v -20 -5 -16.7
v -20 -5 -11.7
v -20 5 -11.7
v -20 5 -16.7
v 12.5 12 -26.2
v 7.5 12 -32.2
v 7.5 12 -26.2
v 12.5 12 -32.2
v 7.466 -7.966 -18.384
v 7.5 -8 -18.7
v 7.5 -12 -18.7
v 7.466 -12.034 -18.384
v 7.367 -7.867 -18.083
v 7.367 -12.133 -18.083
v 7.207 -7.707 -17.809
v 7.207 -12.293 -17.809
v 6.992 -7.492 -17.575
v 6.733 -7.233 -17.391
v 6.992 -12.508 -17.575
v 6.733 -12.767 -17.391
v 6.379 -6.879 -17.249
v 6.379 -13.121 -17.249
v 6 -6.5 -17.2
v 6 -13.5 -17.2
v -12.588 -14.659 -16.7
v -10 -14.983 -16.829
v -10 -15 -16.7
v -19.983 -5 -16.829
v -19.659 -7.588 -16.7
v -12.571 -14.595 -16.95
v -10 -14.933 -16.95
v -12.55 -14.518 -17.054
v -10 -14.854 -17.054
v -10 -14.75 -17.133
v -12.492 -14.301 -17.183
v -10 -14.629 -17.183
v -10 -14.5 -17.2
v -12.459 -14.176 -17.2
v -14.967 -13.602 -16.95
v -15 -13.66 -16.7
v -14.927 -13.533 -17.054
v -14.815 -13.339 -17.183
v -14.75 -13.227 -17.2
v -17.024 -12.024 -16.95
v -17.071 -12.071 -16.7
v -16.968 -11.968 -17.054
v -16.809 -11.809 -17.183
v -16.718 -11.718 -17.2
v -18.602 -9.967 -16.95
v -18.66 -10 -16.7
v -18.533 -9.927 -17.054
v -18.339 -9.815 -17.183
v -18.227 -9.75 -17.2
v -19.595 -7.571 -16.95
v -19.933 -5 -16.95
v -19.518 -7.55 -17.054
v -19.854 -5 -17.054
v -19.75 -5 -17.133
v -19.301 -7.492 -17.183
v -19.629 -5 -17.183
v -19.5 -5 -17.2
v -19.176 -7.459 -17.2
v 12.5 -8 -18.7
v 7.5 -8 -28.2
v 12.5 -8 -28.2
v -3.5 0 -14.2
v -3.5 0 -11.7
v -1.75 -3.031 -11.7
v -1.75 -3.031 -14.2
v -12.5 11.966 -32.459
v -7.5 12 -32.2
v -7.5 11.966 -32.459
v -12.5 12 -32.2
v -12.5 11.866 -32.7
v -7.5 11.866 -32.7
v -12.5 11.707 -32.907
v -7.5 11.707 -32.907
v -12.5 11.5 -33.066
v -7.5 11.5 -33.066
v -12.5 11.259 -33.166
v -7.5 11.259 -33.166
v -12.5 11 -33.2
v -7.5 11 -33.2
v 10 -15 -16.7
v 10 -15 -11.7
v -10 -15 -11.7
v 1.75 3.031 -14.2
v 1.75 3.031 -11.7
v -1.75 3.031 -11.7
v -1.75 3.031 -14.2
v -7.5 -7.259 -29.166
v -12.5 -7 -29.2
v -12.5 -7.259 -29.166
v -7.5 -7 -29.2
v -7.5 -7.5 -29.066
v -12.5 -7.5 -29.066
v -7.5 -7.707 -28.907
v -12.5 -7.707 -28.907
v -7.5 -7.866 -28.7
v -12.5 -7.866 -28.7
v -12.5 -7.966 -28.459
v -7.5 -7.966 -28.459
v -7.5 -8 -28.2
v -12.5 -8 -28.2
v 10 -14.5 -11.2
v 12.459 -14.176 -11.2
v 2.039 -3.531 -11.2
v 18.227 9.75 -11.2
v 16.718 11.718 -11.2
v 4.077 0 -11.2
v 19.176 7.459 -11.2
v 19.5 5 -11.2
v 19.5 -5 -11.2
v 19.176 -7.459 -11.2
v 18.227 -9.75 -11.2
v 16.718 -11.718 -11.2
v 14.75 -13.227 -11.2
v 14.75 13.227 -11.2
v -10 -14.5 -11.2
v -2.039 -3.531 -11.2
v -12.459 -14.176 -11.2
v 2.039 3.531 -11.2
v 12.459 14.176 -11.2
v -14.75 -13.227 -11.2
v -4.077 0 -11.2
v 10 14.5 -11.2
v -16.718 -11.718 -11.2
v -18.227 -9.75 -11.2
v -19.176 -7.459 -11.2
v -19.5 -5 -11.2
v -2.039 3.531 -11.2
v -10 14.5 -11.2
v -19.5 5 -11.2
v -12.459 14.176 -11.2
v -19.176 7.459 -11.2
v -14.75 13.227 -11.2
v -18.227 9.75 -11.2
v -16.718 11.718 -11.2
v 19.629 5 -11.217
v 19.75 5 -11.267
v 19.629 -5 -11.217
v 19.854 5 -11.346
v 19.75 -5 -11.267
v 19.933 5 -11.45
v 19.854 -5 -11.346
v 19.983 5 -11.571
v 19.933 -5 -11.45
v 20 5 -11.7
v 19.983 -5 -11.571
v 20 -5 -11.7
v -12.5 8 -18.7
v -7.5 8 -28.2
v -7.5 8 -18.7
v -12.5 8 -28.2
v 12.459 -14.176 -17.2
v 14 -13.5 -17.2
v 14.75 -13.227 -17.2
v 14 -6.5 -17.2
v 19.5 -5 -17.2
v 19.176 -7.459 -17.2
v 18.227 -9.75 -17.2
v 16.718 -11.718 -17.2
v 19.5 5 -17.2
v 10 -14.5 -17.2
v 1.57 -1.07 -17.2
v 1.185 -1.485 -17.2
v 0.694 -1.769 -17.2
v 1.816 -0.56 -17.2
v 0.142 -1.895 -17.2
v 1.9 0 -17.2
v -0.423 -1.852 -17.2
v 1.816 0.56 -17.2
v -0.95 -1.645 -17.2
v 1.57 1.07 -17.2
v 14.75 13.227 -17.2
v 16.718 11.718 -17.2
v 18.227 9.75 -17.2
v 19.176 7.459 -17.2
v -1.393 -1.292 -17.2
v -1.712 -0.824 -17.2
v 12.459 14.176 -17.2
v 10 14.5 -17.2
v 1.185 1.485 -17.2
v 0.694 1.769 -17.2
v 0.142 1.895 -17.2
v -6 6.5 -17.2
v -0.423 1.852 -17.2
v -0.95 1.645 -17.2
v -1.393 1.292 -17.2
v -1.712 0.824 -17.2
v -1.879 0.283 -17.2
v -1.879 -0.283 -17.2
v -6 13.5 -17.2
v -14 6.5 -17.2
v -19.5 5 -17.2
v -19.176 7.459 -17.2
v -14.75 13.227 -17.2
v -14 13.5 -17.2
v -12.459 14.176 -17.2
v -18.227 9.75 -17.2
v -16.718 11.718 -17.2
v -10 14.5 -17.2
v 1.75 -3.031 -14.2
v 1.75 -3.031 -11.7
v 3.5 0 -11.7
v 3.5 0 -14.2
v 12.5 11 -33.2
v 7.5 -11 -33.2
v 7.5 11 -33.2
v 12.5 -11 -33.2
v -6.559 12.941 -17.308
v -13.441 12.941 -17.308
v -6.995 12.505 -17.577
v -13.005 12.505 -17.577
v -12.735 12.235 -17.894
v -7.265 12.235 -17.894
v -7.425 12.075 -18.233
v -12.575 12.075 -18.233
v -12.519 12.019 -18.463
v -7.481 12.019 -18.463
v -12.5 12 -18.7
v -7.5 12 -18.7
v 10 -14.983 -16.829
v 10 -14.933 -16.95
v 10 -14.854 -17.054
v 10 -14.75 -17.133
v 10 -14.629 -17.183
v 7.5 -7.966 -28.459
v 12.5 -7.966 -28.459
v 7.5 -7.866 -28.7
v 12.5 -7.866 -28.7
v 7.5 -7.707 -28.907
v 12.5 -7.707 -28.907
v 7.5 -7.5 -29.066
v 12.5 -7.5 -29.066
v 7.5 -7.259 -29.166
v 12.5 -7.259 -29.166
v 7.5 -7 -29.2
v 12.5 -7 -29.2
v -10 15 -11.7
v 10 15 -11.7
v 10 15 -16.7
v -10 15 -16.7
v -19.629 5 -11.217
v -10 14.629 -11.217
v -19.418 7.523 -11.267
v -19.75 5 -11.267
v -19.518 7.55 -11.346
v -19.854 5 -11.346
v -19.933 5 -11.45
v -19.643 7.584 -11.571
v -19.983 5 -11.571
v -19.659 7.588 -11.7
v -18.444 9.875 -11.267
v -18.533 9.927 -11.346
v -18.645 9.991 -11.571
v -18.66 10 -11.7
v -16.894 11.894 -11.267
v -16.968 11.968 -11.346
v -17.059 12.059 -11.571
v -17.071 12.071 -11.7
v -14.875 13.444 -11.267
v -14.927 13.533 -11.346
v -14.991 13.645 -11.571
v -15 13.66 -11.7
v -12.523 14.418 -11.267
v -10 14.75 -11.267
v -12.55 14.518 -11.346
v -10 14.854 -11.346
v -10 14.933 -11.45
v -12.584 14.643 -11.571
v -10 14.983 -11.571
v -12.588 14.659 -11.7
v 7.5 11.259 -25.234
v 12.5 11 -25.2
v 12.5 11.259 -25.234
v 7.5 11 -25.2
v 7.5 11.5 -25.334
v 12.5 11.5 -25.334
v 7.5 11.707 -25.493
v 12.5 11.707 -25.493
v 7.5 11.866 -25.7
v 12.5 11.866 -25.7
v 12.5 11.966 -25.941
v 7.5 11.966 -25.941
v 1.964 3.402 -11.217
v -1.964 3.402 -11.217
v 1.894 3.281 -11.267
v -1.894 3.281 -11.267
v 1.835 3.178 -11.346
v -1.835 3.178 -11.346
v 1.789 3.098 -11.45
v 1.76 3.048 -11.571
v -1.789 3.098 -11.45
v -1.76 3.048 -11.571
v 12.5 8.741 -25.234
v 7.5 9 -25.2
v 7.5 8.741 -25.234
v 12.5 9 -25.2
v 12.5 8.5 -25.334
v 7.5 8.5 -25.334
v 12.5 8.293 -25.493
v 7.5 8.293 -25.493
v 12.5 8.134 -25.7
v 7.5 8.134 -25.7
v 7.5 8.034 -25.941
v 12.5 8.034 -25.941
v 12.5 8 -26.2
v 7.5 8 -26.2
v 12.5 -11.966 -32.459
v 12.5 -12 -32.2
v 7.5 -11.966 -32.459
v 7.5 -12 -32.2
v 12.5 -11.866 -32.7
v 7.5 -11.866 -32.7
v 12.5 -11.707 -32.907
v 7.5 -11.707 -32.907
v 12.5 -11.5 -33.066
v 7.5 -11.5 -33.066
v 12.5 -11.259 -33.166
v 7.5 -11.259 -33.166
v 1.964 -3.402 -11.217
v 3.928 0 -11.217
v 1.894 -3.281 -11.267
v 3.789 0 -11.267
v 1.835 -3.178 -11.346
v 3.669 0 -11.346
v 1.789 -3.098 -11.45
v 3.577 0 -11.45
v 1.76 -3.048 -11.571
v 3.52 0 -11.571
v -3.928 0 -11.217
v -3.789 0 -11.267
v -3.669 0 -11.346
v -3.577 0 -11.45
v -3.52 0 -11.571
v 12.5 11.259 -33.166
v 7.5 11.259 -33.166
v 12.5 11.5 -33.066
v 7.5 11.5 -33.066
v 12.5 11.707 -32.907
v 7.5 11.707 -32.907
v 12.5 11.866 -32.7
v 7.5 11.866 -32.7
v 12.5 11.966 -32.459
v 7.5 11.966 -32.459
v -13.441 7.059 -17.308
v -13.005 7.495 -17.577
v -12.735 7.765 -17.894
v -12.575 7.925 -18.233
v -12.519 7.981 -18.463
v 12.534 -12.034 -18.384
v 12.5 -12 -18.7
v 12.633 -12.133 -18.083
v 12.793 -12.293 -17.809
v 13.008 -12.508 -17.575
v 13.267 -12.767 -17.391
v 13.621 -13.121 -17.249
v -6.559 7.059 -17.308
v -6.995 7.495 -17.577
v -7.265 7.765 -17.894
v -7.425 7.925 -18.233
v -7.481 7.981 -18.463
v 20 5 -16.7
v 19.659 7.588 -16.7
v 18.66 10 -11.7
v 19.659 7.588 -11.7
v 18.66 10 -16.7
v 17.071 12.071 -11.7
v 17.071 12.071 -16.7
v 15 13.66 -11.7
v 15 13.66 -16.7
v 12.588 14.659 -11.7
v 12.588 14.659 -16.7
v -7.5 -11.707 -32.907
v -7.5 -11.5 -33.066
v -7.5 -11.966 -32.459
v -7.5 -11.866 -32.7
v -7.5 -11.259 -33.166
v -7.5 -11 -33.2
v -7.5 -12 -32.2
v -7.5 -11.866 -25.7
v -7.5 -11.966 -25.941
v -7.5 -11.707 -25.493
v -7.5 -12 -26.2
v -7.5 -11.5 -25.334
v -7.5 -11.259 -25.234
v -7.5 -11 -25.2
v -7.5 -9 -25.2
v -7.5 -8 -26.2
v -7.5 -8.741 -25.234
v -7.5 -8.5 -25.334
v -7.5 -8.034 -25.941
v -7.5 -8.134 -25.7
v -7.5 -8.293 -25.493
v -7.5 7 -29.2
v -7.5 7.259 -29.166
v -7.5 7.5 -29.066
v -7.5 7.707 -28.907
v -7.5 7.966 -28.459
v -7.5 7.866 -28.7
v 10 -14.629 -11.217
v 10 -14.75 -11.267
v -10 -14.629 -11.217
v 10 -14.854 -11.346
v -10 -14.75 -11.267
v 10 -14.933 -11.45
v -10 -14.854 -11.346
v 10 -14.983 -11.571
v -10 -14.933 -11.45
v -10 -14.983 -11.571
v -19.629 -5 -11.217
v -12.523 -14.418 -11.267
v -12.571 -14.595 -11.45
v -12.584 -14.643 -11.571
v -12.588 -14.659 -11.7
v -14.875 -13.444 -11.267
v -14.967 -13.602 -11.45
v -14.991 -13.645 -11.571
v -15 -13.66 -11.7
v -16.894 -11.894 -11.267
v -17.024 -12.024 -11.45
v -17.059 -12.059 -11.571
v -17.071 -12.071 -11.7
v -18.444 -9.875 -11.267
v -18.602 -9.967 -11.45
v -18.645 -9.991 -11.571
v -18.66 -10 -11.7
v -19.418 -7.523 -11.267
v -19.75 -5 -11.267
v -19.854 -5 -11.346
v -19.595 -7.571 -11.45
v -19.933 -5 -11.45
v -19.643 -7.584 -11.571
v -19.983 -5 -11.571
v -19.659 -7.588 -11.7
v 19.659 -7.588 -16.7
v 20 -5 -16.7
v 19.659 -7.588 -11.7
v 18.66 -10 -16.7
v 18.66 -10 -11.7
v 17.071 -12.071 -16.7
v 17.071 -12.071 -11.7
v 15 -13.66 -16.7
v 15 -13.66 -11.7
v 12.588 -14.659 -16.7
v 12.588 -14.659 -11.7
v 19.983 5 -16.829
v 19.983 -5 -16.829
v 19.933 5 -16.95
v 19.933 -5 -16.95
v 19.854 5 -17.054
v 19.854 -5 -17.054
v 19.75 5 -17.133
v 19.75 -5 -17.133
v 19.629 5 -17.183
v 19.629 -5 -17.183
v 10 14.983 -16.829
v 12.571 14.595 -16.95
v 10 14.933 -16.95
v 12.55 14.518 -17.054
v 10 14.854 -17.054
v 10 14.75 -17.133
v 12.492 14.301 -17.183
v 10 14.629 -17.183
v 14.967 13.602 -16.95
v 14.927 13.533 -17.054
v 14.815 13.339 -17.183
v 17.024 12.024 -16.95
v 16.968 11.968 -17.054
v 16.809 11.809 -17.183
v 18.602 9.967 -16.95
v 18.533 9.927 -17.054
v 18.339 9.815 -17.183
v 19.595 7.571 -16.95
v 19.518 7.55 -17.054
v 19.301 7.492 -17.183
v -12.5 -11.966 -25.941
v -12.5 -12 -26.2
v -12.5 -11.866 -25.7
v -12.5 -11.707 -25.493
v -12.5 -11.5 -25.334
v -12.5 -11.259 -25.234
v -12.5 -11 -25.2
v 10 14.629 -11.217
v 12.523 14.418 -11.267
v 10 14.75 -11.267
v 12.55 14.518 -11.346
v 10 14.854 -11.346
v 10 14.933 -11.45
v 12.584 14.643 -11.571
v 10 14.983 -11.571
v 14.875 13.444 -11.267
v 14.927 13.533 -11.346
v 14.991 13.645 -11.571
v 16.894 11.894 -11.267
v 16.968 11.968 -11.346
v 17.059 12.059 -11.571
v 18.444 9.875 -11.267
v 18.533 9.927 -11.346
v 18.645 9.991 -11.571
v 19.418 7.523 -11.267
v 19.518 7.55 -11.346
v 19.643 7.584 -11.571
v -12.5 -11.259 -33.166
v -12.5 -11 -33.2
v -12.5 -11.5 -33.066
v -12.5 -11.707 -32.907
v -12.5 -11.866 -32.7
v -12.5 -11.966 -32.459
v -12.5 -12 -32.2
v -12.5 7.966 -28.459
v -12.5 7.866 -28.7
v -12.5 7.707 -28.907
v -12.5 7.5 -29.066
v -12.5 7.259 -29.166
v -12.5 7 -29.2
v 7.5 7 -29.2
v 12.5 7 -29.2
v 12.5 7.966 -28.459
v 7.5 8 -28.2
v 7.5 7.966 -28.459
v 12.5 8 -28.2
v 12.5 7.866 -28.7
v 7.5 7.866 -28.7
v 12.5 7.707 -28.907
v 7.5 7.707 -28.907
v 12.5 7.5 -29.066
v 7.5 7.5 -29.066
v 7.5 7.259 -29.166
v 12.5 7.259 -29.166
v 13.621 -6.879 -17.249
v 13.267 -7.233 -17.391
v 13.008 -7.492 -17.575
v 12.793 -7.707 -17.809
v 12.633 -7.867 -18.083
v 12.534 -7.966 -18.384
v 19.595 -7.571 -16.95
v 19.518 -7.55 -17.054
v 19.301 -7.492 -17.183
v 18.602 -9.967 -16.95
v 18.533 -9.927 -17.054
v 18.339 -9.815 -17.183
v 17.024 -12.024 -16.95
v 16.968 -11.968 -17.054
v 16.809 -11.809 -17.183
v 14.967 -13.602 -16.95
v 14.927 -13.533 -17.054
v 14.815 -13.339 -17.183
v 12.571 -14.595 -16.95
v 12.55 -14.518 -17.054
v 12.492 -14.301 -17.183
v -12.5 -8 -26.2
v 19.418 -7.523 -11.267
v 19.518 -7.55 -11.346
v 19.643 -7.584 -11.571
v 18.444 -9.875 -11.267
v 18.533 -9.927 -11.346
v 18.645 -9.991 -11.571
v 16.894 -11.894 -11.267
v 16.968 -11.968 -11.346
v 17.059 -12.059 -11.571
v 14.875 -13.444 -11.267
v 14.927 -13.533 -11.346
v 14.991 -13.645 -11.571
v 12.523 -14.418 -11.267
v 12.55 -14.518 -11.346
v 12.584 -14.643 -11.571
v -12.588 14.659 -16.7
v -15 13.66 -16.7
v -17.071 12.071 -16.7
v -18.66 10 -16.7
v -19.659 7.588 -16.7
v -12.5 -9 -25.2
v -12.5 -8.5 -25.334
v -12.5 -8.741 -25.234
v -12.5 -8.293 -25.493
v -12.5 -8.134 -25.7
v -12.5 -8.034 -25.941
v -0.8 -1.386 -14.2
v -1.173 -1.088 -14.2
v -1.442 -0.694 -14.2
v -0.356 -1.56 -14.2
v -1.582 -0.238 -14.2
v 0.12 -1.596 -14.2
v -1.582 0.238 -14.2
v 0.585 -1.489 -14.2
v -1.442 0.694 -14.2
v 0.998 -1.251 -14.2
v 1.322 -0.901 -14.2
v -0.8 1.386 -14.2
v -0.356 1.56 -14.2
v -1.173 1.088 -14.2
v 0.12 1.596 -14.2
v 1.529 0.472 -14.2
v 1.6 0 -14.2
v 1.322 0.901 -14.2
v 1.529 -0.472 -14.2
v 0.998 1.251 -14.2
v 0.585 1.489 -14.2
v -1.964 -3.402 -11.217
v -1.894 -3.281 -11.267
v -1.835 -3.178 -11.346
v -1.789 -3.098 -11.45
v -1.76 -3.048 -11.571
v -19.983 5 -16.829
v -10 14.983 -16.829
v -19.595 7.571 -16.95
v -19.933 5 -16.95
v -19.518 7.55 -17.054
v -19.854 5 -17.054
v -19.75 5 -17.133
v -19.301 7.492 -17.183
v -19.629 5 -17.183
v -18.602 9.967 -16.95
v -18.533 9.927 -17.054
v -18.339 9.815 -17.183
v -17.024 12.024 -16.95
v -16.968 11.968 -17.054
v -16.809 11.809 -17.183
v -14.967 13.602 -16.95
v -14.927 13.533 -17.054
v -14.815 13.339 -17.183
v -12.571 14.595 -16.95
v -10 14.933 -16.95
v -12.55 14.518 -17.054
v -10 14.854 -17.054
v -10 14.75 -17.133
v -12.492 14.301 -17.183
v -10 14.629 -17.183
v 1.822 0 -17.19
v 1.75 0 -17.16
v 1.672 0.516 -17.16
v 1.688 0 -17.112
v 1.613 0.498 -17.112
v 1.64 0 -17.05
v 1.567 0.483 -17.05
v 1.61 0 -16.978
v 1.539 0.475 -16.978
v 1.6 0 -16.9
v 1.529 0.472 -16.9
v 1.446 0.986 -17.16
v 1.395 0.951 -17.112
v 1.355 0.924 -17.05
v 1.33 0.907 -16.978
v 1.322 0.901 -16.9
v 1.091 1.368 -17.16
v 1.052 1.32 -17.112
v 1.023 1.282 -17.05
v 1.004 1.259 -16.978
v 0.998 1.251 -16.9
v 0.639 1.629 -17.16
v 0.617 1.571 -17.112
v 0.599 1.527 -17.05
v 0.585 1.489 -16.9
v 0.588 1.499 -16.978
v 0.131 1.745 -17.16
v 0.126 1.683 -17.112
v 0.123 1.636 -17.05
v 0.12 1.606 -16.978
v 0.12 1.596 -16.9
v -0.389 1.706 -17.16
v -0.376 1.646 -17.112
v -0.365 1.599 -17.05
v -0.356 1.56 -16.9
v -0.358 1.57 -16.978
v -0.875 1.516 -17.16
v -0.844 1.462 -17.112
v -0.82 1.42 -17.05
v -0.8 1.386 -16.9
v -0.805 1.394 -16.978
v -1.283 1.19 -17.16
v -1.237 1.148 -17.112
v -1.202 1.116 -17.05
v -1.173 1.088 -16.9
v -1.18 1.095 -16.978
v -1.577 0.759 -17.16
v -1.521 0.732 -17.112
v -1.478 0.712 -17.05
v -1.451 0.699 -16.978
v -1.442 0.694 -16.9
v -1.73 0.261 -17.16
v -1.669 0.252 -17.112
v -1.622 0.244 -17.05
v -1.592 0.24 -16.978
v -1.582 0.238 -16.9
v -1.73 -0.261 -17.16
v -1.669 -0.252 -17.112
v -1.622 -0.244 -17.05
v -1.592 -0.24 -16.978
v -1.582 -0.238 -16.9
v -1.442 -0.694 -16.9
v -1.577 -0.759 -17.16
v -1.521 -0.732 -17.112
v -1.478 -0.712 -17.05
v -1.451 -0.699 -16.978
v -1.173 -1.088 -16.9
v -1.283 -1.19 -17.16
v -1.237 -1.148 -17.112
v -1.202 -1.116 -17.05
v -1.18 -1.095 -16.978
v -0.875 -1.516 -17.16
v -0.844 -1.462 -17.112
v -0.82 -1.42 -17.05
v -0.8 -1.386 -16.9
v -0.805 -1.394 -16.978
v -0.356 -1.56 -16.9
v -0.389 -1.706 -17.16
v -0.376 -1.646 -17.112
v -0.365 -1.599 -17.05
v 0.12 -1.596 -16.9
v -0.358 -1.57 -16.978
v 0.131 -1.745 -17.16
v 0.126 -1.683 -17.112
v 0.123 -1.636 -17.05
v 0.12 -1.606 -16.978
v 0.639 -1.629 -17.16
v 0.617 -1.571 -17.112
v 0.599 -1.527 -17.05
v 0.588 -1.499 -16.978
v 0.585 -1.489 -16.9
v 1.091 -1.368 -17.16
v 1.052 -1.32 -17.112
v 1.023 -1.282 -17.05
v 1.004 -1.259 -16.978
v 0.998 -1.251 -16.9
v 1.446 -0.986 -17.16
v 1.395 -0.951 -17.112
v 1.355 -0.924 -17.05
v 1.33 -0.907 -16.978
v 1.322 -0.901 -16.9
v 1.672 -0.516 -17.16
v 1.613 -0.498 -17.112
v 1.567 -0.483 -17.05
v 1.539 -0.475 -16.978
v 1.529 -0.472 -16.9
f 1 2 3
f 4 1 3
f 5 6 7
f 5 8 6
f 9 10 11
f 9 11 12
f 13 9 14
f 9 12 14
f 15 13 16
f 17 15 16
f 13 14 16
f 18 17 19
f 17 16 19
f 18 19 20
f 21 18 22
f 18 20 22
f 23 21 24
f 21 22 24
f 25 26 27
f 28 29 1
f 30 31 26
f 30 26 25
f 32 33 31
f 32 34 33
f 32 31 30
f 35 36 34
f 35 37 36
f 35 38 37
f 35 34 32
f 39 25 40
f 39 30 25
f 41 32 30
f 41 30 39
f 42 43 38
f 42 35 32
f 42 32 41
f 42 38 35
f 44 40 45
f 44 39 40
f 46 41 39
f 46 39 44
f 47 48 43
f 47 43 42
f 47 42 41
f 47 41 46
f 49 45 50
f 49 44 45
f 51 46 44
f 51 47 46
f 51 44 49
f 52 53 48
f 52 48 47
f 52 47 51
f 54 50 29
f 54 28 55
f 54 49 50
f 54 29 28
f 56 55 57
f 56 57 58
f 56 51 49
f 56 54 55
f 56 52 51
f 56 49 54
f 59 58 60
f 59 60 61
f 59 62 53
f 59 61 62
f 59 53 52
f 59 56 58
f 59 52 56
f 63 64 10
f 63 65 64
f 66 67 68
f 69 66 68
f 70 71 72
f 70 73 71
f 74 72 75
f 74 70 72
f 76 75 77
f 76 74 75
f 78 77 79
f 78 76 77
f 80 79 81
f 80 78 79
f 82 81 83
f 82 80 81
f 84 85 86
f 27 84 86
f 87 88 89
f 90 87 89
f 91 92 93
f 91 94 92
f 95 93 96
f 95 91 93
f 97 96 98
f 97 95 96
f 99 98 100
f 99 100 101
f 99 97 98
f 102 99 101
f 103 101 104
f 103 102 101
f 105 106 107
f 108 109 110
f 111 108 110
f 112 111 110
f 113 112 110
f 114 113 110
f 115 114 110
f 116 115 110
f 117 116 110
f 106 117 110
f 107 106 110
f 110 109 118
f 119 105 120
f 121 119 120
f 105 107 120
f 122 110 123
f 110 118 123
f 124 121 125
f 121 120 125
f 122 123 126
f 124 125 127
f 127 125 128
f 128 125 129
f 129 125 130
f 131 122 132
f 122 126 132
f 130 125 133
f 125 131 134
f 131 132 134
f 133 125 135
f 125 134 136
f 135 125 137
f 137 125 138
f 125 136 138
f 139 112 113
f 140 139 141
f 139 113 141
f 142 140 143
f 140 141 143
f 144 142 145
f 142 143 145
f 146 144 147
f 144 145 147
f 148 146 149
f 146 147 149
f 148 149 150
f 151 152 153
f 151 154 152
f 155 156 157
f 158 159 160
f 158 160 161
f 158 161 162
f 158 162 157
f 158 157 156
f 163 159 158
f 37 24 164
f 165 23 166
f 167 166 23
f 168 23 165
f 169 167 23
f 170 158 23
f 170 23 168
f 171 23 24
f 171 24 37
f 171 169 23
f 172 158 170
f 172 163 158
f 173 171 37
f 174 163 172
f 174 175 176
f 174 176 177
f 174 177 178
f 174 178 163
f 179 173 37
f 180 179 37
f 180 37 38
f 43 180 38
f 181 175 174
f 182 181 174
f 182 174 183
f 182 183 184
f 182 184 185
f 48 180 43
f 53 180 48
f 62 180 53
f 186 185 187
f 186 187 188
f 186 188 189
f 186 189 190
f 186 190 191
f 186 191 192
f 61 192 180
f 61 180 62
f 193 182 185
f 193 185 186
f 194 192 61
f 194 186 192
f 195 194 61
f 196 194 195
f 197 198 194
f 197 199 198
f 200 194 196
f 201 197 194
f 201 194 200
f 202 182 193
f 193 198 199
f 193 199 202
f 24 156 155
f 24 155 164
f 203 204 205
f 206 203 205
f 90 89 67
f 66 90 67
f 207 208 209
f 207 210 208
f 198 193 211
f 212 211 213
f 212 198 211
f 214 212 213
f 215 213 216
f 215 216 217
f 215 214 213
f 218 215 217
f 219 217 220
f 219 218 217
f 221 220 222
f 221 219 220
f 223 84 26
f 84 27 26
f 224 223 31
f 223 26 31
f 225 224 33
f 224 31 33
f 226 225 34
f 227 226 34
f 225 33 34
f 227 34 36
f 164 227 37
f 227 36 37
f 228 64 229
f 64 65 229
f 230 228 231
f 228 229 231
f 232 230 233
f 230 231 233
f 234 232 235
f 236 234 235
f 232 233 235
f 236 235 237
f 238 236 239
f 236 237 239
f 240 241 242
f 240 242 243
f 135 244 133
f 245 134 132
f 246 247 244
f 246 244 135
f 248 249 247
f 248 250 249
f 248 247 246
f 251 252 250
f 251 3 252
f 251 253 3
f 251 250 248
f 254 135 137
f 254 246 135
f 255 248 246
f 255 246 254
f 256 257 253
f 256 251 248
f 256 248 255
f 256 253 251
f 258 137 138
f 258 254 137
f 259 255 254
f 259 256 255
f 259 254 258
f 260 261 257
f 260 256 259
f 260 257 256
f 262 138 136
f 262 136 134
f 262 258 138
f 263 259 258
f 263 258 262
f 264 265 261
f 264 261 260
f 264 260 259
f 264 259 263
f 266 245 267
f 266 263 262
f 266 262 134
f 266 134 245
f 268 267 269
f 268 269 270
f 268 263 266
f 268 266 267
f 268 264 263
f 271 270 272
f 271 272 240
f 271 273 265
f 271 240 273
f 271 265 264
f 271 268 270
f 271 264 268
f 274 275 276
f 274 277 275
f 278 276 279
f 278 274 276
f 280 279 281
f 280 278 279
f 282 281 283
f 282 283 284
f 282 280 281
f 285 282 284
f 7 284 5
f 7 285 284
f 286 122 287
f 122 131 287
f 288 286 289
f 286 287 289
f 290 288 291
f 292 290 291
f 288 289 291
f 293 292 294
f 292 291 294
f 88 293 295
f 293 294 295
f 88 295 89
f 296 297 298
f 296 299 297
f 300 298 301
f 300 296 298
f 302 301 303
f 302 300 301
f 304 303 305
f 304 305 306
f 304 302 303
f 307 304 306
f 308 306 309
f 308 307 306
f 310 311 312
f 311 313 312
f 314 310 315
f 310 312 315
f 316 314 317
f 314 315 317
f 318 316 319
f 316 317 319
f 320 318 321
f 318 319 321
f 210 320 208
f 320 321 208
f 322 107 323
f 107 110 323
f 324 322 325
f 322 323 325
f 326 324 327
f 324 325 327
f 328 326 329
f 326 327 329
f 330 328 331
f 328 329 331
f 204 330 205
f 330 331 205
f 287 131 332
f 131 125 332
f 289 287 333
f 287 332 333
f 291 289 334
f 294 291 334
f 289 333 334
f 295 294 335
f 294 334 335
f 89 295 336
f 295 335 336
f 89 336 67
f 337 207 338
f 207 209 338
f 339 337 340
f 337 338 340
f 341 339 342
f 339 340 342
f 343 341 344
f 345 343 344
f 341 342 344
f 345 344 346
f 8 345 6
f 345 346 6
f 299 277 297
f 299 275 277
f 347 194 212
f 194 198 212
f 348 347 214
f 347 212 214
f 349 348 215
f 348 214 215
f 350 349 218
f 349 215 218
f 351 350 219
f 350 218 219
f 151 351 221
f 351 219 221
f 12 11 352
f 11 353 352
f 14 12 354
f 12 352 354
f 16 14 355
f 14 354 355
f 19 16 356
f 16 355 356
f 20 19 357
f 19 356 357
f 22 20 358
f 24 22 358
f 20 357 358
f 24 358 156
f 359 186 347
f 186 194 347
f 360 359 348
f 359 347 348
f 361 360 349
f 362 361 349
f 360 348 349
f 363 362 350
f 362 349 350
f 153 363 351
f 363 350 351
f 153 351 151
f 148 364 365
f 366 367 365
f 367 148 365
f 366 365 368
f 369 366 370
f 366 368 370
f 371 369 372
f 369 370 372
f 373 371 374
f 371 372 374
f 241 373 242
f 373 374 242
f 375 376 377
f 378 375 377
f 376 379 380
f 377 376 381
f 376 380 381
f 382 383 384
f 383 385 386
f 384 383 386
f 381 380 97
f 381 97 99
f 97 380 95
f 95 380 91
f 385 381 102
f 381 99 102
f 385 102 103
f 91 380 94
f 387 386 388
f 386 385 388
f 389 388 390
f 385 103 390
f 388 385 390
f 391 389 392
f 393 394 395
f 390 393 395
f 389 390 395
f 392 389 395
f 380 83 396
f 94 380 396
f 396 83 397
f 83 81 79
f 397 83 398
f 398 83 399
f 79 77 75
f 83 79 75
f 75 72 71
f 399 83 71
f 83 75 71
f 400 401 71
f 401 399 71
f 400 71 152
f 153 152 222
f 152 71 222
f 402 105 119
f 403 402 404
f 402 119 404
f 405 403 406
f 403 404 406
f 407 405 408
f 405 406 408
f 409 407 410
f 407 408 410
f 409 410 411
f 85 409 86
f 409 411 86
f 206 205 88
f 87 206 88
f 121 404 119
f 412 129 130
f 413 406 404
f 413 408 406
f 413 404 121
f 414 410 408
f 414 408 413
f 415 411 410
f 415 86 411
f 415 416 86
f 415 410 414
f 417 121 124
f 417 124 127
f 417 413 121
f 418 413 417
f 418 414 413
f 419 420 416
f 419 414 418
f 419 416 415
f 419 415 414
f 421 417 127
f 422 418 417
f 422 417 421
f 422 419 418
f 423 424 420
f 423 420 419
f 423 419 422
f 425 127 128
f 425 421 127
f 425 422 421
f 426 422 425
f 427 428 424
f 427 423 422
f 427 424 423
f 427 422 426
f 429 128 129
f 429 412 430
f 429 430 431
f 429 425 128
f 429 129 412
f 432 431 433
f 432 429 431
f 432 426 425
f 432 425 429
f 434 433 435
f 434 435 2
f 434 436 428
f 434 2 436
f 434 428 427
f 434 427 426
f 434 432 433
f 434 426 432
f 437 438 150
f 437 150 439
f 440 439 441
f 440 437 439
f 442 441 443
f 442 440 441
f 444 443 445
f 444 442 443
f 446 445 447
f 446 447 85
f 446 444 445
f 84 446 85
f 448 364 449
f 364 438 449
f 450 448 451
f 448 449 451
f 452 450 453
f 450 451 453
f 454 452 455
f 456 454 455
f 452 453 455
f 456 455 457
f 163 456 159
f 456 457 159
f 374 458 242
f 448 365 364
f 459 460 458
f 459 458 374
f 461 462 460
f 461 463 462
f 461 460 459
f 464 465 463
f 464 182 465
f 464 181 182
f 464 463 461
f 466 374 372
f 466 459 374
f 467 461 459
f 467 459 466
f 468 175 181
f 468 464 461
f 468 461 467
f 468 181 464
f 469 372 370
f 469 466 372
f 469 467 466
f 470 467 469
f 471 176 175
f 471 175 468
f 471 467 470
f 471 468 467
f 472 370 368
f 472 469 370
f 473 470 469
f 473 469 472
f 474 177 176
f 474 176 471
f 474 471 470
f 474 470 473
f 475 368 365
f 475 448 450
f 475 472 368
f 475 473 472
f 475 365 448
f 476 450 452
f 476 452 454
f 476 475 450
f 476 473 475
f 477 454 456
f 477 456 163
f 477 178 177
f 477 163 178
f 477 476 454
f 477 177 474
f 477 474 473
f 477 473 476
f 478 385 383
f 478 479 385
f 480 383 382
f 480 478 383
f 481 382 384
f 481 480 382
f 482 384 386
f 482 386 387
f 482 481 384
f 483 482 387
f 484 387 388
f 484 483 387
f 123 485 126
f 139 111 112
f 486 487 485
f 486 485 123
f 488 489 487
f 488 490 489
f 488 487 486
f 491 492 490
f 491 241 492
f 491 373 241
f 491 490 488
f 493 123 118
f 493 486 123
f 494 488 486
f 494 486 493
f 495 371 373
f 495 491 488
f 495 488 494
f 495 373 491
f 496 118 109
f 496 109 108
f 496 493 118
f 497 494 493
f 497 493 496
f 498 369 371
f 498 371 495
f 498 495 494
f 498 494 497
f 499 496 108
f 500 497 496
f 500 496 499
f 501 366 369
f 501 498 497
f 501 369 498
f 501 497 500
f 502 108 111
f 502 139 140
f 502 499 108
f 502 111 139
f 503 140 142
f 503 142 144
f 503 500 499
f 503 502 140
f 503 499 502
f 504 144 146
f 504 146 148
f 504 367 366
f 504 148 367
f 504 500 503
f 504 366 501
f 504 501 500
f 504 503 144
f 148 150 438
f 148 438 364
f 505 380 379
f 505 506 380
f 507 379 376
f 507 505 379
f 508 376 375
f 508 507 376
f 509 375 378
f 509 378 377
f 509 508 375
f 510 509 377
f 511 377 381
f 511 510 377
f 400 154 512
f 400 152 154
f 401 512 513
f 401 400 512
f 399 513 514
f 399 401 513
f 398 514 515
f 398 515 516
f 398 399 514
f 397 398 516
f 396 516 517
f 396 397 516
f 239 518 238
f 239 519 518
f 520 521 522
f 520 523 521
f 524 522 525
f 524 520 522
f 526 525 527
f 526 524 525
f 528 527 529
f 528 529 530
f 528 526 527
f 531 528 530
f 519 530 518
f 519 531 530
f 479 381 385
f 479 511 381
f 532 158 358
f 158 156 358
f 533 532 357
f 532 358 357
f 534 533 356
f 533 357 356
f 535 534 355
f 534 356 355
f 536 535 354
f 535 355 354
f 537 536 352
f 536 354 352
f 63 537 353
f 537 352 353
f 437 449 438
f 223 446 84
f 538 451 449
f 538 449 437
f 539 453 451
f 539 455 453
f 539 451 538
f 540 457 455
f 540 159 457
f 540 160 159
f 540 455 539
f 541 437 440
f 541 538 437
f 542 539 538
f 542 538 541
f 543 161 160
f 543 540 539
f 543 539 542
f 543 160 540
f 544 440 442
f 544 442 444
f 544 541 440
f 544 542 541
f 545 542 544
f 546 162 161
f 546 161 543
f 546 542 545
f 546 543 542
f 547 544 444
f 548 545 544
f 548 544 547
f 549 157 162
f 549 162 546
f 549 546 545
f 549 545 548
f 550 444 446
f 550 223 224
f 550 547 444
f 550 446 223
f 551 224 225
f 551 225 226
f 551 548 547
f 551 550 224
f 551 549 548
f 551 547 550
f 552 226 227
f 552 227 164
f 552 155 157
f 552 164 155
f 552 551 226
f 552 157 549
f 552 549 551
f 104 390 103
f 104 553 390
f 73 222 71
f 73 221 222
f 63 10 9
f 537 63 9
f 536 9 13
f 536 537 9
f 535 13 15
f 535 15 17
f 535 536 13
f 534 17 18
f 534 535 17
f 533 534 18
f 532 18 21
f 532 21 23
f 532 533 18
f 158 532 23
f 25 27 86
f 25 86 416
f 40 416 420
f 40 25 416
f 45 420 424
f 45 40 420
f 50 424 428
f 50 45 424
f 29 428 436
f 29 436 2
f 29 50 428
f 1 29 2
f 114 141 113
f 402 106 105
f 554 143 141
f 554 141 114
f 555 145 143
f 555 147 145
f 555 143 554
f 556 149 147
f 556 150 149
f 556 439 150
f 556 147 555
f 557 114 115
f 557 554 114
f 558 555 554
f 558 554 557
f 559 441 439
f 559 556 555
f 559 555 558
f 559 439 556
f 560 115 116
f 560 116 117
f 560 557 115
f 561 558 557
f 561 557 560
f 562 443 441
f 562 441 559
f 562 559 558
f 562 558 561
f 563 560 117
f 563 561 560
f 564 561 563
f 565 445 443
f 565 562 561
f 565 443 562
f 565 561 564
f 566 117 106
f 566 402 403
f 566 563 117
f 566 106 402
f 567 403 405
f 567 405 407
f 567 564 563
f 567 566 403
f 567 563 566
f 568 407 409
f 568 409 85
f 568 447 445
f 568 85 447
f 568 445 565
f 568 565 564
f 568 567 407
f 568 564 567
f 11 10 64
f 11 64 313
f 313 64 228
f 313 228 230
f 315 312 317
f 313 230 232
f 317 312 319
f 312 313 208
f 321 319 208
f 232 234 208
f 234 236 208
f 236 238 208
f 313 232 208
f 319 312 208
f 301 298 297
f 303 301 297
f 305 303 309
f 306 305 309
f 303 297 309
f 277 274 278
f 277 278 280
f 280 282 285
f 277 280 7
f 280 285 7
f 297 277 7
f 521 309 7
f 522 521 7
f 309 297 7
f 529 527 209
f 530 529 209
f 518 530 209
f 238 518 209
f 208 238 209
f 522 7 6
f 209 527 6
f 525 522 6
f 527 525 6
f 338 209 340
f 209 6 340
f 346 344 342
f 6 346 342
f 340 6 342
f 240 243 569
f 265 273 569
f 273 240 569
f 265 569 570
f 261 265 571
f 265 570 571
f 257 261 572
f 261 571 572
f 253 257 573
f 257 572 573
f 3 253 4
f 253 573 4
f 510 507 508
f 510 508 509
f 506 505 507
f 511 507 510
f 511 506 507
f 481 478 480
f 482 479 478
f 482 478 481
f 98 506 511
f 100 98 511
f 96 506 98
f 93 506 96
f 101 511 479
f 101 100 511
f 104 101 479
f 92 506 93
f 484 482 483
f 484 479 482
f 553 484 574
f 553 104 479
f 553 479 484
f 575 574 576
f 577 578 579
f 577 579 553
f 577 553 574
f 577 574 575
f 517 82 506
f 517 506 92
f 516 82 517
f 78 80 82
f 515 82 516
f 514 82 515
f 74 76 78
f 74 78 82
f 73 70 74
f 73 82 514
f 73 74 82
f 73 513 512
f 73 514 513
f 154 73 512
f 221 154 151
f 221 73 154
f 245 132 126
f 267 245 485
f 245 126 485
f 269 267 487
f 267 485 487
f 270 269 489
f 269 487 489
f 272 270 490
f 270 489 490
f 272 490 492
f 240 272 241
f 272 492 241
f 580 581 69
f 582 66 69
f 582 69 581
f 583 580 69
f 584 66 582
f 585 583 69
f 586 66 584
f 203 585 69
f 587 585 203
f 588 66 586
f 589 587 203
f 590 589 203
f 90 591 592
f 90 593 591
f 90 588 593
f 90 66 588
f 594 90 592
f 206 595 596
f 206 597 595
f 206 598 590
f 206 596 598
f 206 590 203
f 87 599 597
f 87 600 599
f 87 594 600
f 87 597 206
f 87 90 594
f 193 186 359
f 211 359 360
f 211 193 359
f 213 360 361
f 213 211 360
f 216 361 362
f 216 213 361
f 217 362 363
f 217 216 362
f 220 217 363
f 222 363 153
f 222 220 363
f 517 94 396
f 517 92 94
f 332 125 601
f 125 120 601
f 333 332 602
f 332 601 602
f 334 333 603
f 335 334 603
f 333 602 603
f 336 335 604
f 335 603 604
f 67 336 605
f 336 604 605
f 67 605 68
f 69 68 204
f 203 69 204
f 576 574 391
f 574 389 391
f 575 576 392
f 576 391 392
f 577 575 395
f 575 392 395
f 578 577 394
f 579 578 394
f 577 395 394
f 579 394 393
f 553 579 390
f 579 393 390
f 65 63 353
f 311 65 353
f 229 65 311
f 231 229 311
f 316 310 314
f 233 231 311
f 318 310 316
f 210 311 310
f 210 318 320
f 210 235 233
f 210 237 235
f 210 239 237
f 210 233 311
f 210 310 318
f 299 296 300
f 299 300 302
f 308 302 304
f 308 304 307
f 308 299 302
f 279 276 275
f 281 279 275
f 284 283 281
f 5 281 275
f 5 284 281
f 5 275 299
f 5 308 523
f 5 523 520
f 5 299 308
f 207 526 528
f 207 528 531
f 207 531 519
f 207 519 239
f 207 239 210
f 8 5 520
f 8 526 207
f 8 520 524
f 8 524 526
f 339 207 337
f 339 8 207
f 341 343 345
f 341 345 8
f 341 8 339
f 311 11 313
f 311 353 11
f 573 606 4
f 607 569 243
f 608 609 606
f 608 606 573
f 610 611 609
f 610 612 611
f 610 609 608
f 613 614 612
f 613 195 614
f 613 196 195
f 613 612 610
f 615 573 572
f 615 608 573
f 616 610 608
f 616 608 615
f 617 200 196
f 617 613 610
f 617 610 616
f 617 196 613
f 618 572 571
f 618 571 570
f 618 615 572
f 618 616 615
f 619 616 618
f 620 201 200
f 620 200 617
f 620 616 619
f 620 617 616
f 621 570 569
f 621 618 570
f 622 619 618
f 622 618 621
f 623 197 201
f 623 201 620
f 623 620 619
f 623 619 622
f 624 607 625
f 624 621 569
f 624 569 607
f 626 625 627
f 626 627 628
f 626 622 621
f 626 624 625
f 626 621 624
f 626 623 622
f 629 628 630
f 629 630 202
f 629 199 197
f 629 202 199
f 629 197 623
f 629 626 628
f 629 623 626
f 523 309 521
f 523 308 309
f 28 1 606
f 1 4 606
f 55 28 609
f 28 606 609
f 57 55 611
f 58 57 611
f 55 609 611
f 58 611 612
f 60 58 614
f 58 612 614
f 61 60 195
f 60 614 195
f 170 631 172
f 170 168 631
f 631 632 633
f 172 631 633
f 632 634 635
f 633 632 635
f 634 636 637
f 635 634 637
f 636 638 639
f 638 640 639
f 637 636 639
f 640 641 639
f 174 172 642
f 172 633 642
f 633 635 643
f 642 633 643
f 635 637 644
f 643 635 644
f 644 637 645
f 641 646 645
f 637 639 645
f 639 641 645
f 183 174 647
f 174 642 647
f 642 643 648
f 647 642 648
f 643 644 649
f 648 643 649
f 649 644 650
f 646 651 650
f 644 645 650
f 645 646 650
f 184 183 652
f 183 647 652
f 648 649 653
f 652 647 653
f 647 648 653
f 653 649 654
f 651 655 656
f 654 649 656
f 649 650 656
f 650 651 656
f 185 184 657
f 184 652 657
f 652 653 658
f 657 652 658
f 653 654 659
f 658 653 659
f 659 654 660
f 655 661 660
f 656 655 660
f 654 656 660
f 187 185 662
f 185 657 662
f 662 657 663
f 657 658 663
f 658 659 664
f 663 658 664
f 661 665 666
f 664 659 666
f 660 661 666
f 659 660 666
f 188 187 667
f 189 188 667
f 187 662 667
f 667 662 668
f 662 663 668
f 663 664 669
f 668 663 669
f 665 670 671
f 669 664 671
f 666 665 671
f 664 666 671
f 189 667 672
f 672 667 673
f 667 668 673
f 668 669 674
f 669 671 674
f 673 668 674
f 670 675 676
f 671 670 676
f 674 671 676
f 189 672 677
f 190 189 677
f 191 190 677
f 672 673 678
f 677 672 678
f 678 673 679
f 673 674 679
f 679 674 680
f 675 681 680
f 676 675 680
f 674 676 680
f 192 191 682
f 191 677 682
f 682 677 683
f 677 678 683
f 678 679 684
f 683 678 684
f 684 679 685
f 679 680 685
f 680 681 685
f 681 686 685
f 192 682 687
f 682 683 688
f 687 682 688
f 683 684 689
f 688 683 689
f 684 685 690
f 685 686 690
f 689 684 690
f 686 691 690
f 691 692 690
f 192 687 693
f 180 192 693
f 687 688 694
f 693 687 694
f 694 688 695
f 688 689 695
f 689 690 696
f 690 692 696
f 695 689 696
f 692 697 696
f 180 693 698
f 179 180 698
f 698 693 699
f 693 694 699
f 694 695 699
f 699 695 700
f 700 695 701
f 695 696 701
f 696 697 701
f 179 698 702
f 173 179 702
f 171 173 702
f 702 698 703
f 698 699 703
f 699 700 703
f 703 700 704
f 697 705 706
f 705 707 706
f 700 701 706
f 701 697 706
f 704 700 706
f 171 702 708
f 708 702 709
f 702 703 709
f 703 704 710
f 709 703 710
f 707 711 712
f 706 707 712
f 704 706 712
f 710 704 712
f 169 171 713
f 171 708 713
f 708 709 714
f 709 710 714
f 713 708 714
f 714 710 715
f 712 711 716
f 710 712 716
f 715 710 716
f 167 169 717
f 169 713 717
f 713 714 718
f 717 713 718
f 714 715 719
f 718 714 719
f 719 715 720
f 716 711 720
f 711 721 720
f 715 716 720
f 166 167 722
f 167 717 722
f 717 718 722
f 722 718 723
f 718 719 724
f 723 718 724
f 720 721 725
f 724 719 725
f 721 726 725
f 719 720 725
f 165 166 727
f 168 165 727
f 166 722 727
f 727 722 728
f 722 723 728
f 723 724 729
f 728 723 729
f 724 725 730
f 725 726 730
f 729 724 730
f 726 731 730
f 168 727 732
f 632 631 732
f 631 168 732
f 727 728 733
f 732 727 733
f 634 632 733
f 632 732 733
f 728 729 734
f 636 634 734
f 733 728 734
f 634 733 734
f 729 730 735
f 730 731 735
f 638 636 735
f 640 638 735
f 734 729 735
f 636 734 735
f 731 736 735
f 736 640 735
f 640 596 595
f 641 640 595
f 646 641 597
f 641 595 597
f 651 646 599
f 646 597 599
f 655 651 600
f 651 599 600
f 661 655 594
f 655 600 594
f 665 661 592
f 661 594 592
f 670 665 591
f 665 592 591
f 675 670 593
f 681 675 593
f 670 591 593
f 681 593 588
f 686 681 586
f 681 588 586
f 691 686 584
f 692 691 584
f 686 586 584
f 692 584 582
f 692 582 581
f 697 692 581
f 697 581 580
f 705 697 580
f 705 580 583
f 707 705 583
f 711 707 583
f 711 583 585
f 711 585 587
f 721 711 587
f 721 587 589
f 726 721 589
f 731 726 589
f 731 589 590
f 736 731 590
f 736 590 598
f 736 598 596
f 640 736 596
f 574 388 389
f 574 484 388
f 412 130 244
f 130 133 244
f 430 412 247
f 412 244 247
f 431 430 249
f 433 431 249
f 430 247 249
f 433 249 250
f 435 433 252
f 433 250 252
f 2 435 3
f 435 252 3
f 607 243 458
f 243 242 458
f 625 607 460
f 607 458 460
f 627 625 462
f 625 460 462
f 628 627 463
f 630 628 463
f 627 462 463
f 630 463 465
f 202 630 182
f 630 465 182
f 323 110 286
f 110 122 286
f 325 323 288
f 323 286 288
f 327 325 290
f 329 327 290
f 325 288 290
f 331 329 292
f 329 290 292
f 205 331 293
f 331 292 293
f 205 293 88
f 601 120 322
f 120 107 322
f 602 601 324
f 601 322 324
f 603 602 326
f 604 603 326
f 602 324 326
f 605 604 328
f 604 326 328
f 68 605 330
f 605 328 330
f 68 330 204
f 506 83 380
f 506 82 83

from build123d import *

# Parameters (mm, degrees)
BOSS_EXTRUDE1_DEPTH = 6
SKETCH2_W           = 7.6
SKETCH2_H           = 8.4
BOSS_EXTRUDE2_DEPTH = 4
SKETCH3_W           = 40
SKETCH3_H           = 30
BOSS_EXTRUDE3_DEPTH = 6
BOSS_EXTRUDE4_DEPTH = 2.5
BOSS_EXTRUDE5_DEPTH = 2.5
FILLET1_R           = 10
SKETCH8_R           = 1.6
CUT_EXTRUDE1_DEPTH  = 34.2
FILLET3_R           = 0.5
FILLET4_R           = 0.5
FILLET5_R           = 0.5
SKETCH9_R           = 14.329528823
CUT_EXTRUDE2_DEPTH  = 12.2
CUT_EXTRUDE3_DEPTH  = 3
FILLET6_R           = 0.5
FILLET7_R           = 1
FILLET8_R           = 1.5
FILLET9_R           = 0.3


with BuildPart() as part:
    # Sketch1 → Boss-Extrude1 (new body, symmetric)
    with BuildSketch(Plane(origin=(0, 0, 0), x_dir=(1, 0, 0), z_dir=(0, 1, 0))):
        Polygon((-8, 0), (8, 0), (8, 3.6), (4.3, 7.2), (-4.3, 7.2), (-8, 3.6), align=None)
    extrude(amount=BOSS_EXTRUDE1_DEPTH, both=True)

    # Sketch2 → Boss-Extrude2 (add)
    with BuildSketch(Plane(origin=(0, 0, -7.2), x_dir=(-1, 0, 0), z_dir=(0, 0, -1))):
        Rectangle(SKETCH2_W, SKETCH2_H)
    extrude(amount=BOSS_EXTRUDE2_DEPTH)

    # Sketch3 → Boss-Extrude3 (add)
    with BuildSketch(Plane(origin=(0, 0, -11.2), x_dir=(-1, 0, 0), z_dir=(0, 0, -1))):
        Rectangle(SKETCH3_W, SKETCH3_H)
    extrude(amount=BOSS_EXTRUDE3_DEPTH)

    # Sketch6 → Boss-Extrude4 (add, symmetric)
    with BuildSketch(Plane.ZY.offset(10)):
        Polygon((-29.2, 8), (-17.2, 8), (-17.2, 12), (-33.2, 12), (-33.2, -12), (-25.2, -12), (-25.2, -8), (-29.2, -8), align=None)
    extrude(amount=BOSS_EXTRUDE4_DEPTH, both=True)

    # Sketch7 → Boss-Extrude5 (add, symmetric)
    with BuildSketch(Plane(origin=(10, 0, 0), x_dir=(0, 0, -1), z_dir=(1, 0, 0))):
        Polygon((25.2, 12), (25.2, 8), (29.2, 8), (29.2, -8), (17.2, -8), (17.2, -12), (33.2, -12), (33.2, 12), align=None)
    extrude(amount=BOSS_EXTRUDE5_DEPTH, both=True)

    # Fillet1
    fillet1_edges = [part.edges().sort_by_distance(p)[0] for p in [
        (-20, -15, -14.2),
        (-20, 15, -14.2),
        (20, 15, -14.2),
        (20, -15, -14.2),
    ]]
    fillet(fillet1_edges, radius=FILLET1_R)

    # Sketch8 → Cut-Extrude1 (cut, through all)
    with BuildSketch(Plane.XY):
        Circle(SKETCH8_R)
    extrude(amount=-CUT_EXTRUDE1_DEPTH, mode=Mode.SUBTRACT)

    # Fillet3
    fillet3_edges = [part.edges().sort_by_distance(p)[0] for p in [
        (-6.15, 6, -5.4),
        (-8, 6, -1.8),
        (0, 6, 0),
        (8, 6, -1.8),
        (6.15, 6, -5.4),
        (8, -6, -1.8),
        (0, -6, 0),
        (-8, -6, -1.8),
        (-6.15, -6, -5.4),
        (0, -6, -7.2),
        (6.15, -6, -5.4),
        (0, 6, -7.2),
    ]]
    fillet(fillet3_edges, radius=FILLET3_R)

    # Fillet4
    fillet4_edges = [part.edges().sort_by_distance(p)[0] for p in [
        (-20, 0, -11.2),
        (-20, 0, -17.2),
        (0, -15, -11.2),
        (20, 0, -11.2),
        (0, 15, -11.2),
        (17.071067812, 12.071067812, -11.2),
        (17.071067812, -12.071067812, -11.2),
        (-17.071067812, 12.071067812, -11.2),
        (-17.071067812, -12.071067812, -11.2),
        (0, -15, -17.2),
        (0, 15, -17.2),
        (20, 0, -17.2),
        (17.071067812, 12.071067812, -17.2),
        (17.071067812, -12.071067812, -17.2),
        (-17.071067812, 12.071067812, -17.2),
        (-17.071067812, -12.071067812, -17.2),
    ]]
    fillet(fillet4_edges, radius=FILLET4_R)

    # Fillet5
    fillet5_edges = [part.edges().sort_by_distance(p)[0] for p in [
        (-3.8, 0, -11.2),
        (0, 4.2, -11.2),
        (3.8, 0, -11.2),
        (0, -4.2, -11.2),
    ]]
    fillet(fillet5_edges, radius=FILLET5_R)

    # Sketch9 → Cut-Extrude2 (cut, through all)
    with BuildSketch(Plane.XY.offset(-11.2)):
        Circle(SKETCH9_R)
    extrude(amount=CUT_EXTRUDE2_DEPTH, mode=Mode.SUBTRACT)

    # Sketch10 → Cut-Extrude3 (cut)
    with BuildSketch(Plane.XY.offset(-11.2)):
        Polygon((3.5, 0), (1.75, 3.031088913), (-1.75, 3.031088913), (-3.5, 0), (-1.75, -3.031088913), (1.75, -3.031088913), align=None)
    extrude(amount=-CUT_EXTRUDE3_DEPTH, mode=Mode.SUBTRACT)

    # Fillet6
    fillet6_edges = [part.edges().sort_by_distance(p)[0] for p in [
        (2.625, -1.515544457, -11.2),
        (2.625, 1.515544457, -11.2),
        (0, 3.031088913, -11.2),
        (-2.625, 1.515544457, -11.2),
        (-2.625, -1.515544457, -11.2),
        (0, -3.031088913, -11.2),
    ]]
    fillet(fillet6_edges, radius=FILLET6_R)

    # Fillet7
    fillet7_edges = [part.edges().sort_by_distance(p)[0] for p in [
        (-10, 8, -29.2),
        (-10, 12, -33.2),
        (-10, -12, -33.2),
        (-10, -12, -25.2),
        (-10, -8, -25.2),
        (-10, -8, -29.2),
        (10, -12, -33.2),
        (10, 12, -33.2),
        (10, 12, -25.2),
        (10, 8, -25.2),
        (10, 8, -29.2),
        (10, -8, -29.2),
    ]]
    fillet(fillet7_edges, radius=FILLET7_R)

    # Fillet8
    fillet8_edges = [part.edges().sort_by_distance(p)[0] for p in [
        (-7.5, 10, -17.2),
        (-10, 8, -17.2),
        (-10, 12, -17.2),
        (-12.5, 10, -17.2),
        (10, -12, -17.2),
        (7.5, -10, -17.2),
        (10, -8, -17.2),
        (12.5, -10, -17.2),
    ]]
    fillet(fillet8_edges, radius=FILLET8_R)

    # Fillet9
    fillet9_edges = [part.edges().sort_by_distance(p)[0] for p in [
        (-1.6, 0, -17.2),
    ]]
    fillet(fillet9_edges, radius=FILLET9_R)


solid = part.part
